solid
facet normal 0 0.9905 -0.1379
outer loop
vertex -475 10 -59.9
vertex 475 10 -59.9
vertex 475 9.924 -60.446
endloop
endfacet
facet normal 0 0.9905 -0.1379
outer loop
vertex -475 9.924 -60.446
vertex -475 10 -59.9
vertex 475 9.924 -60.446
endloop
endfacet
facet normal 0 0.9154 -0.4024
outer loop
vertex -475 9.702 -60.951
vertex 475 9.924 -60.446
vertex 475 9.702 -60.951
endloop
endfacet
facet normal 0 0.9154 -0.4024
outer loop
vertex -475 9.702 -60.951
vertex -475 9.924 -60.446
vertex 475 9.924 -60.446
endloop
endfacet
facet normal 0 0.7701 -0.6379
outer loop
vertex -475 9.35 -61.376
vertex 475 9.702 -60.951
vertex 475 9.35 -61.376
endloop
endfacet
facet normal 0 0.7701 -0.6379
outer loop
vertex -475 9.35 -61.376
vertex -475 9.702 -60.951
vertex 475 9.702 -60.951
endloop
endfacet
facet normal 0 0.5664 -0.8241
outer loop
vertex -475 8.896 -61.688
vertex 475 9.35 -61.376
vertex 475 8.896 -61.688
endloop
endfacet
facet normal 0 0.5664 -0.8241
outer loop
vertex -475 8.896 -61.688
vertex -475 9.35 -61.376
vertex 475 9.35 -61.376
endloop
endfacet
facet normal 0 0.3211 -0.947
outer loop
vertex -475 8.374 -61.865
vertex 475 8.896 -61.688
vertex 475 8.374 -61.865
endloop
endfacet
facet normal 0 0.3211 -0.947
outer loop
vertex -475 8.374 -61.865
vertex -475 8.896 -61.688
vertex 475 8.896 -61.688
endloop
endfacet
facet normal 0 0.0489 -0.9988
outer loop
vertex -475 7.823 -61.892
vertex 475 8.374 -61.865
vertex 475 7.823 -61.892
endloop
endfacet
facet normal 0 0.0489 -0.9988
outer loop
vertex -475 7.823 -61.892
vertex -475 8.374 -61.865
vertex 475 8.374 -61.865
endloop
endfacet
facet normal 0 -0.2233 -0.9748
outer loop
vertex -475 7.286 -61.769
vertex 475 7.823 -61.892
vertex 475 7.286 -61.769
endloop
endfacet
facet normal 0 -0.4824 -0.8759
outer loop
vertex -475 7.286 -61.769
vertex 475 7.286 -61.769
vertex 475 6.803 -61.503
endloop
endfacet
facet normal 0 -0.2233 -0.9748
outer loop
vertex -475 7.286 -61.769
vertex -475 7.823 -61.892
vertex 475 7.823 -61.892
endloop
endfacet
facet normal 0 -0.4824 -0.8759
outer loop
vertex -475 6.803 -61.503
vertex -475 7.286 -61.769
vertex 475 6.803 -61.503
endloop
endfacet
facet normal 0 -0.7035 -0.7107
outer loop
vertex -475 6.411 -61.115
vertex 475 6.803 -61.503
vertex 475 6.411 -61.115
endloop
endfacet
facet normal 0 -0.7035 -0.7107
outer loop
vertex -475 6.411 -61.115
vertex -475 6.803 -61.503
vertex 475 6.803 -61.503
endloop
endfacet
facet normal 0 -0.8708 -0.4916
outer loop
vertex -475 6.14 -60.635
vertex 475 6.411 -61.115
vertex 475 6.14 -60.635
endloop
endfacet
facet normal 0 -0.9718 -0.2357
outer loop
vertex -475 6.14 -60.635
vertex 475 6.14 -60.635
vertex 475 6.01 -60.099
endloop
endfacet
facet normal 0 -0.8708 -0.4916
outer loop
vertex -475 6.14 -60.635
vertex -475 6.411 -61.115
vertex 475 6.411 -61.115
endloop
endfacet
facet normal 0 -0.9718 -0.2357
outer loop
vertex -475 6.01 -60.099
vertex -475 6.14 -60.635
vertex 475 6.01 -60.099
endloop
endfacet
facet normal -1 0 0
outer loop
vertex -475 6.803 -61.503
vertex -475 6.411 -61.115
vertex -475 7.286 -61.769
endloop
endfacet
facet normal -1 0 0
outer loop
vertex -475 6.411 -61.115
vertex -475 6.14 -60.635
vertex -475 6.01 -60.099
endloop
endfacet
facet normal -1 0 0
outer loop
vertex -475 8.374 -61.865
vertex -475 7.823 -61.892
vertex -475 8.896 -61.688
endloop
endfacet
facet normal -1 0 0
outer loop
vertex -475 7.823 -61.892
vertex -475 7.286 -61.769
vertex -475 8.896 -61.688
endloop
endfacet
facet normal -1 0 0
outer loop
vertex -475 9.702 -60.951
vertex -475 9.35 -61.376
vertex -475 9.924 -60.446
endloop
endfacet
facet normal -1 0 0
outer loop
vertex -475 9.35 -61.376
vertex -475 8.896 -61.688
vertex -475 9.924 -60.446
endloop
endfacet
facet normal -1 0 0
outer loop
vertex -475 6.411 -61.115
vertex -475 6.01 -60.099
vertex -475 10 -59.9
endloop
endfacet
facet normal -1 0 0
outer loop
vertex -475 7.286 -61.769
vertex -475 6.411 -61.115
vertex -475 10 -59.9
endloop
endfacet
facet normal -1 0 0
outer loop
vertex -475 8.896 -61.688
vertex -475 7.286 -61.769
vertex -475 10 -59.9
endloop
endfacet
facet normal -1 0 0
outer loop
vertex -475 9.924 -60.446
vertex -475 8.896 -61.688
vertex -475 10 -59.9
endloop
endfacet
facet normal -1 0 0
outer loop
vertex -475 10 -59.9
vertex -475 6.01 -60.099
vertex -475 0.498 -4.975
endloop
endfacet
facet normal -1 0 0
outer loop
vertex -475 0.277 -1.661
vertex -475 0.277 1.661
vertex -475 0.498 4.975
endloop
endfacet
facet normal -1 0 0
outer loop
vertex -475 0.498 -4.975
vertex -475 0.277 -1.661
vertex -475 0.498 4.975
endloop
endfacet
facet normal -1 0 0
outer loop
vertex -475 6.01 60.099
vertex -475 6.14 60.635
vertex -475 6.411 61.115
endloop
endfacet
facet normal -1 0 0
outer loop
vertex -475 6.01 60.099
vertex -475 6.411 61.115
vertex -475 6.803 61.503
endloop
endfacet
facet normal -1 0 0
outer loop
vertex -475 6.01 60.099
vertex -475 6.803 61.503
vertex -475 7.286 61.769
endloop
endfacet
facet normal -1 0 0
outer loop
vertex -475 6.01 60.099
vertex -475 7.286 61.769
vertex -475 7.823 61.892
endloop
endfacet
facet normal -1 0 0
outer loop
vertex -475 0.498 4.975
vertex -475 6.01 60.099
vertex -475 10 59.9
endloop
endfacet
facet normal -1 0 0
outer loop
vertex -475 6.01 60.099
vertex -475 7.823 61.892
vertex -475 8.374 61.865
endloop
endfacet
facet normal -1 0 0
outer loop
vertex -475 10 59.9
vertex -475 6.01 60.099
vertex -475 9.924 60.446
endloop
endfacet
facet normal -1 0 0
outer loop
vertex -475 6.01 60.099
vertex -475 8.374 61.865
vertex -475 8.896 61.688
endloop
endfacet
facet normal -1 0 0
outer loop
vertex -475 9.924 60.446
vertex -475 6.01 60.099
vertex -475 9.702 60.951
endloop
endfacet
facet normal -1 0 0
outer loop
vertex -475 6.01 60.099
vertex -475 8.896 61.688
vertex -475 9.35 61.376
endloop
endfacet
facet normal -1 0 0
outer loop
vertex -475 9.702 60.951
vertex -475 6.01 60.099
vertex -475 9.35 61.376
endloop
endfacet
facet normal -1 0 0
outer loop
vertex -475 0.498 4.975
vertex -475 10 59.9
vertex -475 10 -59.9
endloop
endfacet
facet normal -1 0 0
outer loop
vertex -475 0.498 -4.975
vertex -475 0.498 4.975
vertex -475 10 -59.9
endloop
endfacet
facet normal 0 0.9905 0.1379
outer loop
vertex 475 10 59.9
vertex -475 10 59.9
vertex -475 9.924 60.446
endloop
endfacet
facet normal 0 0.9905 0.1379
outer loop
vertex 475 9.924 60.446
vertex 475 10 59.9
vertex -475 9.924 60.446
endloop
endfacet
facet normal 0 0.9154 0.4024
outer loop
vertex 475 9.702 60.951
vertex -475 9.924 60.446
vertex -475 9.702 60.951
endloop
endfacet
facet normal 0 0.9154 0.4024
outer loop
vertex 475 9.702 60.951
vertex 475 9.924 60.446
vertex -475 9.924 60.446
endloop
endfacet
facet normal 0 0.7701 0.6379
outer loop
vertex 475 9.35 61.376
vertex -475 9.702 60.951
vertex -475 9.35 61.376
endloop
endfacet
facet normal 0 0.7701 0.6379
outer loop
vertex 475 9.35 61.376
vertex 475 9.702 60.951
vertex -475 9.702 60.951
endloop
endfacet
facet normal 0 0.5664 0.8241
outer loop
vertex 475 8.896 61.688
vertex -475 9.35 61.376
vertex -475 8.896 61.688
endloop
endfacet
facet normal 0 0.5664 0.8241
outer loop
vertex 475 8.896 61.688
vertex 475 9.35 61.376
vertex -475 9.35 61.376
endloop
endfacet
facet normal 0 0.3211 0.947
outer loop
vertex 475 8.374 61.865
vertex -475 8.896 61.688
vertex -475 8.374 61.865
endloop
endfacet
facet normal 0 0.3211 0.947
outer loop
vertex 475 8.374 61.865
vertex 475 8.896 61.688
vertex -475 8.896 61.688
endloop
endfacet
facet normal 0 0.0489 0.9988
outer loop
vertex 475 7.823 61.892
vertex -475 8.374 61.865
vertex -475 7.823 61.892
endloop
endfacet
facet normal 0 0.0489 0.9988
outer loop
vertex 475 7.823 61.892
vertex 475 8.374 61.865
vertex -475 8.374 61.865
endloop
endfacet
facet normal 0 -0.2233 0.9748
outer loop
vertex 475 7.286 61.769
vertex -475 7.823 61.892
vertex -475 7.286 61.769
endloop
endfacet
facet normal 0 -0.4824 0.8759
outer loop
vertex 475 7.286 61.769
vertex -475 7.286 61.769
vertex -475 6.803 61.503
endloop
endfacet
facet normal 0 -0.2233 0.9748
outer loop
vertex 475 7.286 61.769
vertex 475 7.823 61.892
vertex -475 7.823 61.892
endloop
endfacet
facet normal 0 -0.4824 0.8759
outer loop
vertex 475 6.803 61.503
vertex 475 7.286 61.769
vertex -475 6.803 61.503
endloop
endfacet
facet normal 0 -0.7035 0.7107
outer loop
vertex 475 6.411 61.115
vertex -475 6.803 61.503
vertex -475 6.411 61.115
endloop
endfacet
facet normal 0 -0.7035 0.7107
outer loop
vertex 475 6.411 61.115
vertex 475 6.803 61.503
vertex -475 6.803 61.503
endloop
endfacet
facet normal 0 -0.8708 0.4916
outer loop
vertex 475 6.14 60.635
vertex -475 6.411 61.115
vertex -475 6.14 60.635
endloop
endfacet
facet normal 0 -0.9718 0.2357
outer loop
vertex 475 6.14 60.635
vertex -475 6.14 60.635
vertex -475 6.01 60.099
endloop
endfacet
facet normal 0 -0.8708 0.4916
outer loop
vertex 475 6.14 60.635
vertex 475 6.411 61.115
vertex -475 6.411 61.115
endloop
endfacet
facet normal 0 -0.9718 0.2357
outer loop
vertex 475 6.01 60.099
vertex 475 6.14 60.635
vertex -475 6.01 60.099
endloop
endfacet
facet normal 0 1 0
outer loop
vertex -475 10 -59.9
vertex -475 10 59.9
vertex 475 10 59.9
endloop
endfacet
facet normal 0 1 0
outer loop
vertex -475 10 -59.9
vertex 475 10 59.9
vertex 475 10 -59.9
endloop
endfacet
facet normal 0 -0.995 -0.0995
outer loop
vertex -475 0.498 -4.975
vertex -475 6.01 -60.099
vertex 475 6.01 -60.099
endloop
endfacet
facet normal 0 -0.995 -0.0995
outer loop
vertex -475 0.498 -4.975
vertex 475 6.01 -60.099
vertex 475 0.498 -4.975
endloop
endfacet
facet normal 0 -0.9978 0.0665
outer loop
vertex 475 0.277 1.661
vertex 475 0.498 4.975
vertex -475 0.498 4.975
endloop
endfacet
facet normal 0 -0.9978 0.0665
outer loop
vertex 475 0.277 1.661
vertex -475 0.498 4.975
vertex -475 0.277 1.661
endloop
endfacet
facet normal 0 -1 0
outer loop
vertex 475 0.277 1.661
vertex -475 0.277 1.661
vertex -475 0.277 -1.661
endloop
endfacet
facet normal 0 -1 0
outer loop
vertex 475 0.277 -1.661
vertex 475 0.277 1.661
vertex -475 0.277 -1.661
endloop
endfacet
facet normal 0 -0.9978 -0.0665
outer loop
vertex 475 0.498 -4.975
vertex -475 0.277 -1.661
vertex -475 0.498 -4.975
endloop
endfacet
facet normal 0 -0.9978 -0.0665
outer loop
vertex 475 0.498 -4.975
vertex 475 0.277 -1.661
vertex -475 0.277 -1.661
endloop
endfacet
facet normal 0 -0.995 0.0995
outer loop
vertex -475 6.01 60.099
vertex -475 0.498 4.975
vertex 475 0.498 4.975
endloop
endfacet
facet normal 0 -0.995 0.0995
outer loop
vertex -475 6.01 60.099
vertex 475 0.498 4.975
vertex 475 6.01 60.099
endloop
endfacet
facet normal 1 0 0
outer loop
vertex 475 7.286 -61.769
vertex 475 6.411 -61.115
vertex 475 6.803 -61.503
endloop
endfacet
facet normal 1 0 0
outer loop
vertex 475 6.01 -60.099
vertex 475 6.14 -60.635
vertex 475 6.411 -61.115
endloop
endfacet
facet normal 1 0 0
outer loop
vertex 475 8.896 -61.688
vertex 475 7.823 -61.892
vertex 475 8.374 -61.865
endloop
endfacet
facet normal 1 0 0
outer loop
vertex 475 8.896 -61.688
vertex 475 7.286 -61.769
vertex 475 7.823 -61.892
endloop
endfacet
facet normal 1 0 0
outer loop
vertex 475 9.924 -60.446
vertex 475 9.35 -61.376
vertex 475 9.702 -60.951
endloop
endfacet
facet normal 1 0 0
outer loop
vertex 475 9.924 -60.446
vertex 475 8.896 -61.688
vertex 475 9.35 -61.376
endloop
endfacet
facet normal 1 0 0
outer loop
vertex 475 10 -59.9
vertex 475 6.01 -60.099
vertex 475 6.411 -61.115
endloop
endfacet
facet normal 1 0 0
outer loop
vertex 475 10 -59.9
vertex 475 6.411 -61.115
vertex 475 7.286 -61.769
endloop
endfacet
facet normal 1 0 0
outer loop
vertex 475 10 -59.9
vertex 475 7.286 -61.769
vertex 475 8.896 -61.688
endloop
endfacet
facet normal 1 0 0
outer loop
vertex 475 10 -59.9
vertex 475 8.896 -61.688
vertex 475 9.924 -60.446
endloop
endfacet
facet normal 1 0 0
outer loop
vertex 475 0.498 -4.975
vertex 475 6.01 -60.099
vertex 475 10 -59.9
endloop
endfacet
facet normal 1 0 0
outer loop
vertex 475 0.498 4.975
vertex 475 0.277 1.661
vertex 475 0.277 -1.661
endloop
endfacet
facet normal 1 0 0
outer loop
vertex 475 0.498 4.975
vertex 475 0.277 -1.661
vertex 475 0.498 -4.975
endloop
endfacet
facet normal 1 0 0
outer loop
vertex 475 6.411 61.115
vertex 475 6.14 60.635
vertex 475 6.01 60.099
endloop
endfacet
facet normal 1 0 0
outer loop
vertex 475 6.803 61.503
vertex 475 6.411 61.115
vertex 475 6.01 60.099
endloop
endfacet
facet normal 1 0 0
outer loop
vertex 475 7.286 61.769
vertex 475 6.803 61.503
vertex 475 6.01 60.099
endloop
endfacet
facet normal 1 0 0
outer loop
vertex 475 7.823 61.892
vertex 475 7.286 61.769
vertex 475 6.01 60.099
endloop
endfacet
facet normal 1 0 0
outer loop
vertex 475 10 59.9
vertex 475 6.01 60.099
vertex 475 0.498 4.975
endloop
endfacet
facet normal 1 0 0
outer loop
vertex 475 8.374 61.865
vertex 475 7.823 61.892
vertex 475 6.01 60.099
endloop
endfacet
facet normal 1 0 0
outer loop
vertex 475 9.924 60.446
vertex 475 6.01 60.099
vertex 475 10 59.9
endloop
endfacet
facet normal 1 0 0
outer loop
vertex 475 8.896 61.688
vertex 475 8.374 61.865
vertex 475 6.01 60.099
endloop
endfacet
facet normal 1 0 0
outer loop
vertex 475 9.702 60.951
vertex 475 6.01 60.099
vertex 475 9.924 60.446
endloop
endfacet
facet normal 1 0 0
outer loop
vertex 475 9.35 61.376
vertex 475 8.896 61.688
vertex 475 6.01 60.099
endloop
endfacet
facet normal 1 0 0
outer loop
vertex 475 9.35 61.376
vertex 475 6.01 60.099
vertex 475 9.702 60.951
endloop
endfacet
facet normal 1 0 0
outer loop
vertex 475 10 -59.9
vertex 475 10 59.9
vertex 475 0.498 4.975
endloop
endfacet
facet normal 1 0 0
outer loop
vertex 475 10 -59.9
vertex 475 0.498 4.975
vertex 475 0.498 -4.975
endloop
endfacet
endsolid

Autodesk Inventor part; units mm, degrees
ref_plane "YZ Plane" through (0, 0, 0) normal (1, 0, 0) x (0, 1, 0)
ref_plane "XZ Plane" through (0, 0, 0) normal (0, 1, 0) x (-1, 0, 0)
ref_plane "XY Plane" through (0, 0, 0) normal (0, 0, 1) x (1, 0, 0)
sketch "スケッチ1" plane through (0, 0, 0) normal (1, 0, 0) x (0, 1, 0)
  line L0 (10, 100) -> (10, -100)
  line L1 (10, -100) -> (0, 0)
  line L2 (0, 0) -> (10, 100)
  line L3 (-2, 0) -> (12, 0) projected
  point P0 (10, 0)
  dimension "d0" = 200
  dimension "d5" = 10
extrude "押し出し1" add sketch "スケッチ1" along normal mid plane 950
fillet "フィレット1" radius 2 2 edges at (0, 10, 100) (0, 10, -100)
fillet "フィレット1" radius 50 1 edges at (0, 0, 0)
properties part number "foward_flap" material "CFRP"
